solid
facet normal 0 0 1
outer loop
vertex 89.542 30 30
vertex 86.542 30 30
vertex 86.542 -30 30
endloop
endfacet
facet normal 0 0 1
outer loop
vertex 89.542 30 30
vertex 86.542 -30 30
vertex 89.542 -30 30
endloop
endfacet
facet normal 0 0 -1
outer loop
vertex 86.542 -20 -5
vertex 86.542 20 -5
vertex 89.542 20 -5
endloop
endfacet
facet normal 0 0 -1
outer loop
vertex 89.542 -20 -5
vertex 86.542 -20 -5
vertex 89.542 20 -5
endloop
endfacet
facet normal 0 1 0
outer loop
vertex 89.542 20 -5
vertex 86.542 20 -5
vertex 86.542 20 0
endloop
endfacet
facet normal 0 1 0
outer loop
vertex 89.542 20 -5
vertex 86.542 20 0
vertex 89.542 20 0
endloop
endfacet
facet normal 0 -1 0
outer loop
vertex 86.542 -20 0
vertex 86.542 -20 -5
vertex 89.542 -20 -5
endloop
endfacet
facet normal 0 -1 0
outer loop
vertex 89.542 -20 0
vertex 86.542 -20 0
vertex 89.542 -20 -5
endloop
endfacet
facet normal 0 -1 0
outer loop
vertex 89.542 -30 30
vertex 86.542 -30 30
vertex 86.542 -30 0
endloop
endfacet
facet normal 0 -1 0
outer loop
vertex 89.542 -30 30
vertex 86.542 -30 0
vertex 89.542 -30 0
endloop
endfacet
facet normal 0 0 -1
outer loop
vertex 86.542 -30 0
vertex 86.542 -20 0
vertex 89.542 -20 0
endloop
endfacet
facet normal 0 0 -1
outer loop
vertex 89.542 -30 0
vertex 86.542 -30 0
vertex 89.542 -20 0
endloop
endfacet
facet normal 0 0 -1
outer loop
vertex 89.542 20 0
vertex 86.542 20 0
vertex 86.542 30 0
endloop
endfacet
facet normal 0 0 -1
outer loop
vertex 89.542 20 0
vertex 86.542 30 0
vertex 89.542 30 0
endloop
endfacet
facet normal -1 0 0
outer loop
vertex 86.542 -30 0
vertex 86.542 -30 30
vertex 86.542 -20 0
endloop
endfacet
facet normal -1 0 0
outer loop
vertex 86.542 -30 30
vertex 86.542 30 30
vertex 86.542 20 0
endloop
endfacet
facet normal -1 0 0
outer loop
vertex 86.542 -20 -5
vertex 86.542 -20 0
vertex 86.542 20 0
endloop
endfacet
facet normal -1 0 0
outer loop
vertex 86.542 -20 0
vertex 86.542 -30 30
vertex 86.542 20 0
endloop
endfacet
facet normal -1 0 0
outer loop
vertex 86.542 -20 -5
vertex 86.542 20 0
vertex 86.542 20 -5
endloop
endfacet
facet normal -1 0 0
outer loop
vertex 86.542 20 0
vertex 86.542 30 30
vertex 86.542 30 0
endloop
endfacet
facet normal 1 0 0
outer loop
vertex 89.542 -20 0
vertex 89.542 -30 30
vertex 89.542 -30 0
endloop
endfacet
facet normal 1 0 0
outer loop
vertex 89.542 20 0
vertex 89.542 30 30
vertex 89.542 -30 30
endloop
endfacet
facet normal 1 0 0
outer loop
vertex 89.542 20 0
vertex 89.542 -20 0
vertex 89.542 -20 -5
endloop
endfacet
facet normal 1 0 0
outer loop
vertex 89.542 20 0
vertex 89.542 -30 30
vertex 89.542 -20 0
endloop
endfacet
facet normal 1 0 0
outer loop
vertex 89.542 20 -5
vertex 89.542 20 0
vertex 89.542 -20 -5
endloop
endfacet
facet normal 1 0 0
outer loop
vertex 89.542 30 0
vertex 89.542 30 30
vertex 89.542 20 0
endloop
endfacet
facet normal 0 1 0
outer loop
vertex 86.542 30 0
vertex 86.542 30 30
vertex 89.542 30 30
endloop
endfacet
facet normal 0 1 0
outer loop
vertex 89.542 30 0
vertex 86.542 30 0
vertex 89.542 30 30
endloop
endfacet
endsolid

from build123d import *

# Parameters (mm, degrees)
ESTRUSIONE_ESTRUSIONE1_DEPTH      = 30
ESTRUSIONE_ESTRUSIONE1_DEPTH_BACK = 5
SCHIZZO1_W                        = 3
SCHIZZO1_H                        = 40
SCHIZZO2_W                        = 3
SCHIZZO2_H                        = 30
ESTRUSIONE_ESTRUSIONE2_DEPTH      = 10


with BuildPart() as part:
    # Schizzo1 → Estrusione-Estrusione1 (new, two sides: drawn at the far end of the back side and taken through both)
    with BuildSketch(Plane.XY.offset(-ESTRUSIONE_ESTRUSIONE1_DEPTH_BACK)):
        with Locations((88.042298103, 0)):
            Rectangle(SCHIZZO1_W, SCHIZZO1_H)
    extrude(amount=ESTRUSIONE_ESTRUSIONE1_DEPTH + ESTRUSIONE_ESTRUSIONE1_DEPTH_BACK)

    # Schizzo2 → Estrusione-Estrusione2 (add)
    with BuildSketch(Plane(origin=(0, 20, 0), x_dir=(1, 0, 0), z_dir=(0, 1, 0))):
        with Locations((88.042298103, -15)):
            Rectangle(SCHIZZO2_W, SCHIZZO2_H)
    estrusione_estrusione2 = extrude(amount=ESTRUSIONE_ESTRUSIONE2_DEPTH)

    # Specchia1: Estrusione-Estrusione2 across plane
    add(estrusione_estrusione2.mirror(Plane.ZX))


solid = part.part
